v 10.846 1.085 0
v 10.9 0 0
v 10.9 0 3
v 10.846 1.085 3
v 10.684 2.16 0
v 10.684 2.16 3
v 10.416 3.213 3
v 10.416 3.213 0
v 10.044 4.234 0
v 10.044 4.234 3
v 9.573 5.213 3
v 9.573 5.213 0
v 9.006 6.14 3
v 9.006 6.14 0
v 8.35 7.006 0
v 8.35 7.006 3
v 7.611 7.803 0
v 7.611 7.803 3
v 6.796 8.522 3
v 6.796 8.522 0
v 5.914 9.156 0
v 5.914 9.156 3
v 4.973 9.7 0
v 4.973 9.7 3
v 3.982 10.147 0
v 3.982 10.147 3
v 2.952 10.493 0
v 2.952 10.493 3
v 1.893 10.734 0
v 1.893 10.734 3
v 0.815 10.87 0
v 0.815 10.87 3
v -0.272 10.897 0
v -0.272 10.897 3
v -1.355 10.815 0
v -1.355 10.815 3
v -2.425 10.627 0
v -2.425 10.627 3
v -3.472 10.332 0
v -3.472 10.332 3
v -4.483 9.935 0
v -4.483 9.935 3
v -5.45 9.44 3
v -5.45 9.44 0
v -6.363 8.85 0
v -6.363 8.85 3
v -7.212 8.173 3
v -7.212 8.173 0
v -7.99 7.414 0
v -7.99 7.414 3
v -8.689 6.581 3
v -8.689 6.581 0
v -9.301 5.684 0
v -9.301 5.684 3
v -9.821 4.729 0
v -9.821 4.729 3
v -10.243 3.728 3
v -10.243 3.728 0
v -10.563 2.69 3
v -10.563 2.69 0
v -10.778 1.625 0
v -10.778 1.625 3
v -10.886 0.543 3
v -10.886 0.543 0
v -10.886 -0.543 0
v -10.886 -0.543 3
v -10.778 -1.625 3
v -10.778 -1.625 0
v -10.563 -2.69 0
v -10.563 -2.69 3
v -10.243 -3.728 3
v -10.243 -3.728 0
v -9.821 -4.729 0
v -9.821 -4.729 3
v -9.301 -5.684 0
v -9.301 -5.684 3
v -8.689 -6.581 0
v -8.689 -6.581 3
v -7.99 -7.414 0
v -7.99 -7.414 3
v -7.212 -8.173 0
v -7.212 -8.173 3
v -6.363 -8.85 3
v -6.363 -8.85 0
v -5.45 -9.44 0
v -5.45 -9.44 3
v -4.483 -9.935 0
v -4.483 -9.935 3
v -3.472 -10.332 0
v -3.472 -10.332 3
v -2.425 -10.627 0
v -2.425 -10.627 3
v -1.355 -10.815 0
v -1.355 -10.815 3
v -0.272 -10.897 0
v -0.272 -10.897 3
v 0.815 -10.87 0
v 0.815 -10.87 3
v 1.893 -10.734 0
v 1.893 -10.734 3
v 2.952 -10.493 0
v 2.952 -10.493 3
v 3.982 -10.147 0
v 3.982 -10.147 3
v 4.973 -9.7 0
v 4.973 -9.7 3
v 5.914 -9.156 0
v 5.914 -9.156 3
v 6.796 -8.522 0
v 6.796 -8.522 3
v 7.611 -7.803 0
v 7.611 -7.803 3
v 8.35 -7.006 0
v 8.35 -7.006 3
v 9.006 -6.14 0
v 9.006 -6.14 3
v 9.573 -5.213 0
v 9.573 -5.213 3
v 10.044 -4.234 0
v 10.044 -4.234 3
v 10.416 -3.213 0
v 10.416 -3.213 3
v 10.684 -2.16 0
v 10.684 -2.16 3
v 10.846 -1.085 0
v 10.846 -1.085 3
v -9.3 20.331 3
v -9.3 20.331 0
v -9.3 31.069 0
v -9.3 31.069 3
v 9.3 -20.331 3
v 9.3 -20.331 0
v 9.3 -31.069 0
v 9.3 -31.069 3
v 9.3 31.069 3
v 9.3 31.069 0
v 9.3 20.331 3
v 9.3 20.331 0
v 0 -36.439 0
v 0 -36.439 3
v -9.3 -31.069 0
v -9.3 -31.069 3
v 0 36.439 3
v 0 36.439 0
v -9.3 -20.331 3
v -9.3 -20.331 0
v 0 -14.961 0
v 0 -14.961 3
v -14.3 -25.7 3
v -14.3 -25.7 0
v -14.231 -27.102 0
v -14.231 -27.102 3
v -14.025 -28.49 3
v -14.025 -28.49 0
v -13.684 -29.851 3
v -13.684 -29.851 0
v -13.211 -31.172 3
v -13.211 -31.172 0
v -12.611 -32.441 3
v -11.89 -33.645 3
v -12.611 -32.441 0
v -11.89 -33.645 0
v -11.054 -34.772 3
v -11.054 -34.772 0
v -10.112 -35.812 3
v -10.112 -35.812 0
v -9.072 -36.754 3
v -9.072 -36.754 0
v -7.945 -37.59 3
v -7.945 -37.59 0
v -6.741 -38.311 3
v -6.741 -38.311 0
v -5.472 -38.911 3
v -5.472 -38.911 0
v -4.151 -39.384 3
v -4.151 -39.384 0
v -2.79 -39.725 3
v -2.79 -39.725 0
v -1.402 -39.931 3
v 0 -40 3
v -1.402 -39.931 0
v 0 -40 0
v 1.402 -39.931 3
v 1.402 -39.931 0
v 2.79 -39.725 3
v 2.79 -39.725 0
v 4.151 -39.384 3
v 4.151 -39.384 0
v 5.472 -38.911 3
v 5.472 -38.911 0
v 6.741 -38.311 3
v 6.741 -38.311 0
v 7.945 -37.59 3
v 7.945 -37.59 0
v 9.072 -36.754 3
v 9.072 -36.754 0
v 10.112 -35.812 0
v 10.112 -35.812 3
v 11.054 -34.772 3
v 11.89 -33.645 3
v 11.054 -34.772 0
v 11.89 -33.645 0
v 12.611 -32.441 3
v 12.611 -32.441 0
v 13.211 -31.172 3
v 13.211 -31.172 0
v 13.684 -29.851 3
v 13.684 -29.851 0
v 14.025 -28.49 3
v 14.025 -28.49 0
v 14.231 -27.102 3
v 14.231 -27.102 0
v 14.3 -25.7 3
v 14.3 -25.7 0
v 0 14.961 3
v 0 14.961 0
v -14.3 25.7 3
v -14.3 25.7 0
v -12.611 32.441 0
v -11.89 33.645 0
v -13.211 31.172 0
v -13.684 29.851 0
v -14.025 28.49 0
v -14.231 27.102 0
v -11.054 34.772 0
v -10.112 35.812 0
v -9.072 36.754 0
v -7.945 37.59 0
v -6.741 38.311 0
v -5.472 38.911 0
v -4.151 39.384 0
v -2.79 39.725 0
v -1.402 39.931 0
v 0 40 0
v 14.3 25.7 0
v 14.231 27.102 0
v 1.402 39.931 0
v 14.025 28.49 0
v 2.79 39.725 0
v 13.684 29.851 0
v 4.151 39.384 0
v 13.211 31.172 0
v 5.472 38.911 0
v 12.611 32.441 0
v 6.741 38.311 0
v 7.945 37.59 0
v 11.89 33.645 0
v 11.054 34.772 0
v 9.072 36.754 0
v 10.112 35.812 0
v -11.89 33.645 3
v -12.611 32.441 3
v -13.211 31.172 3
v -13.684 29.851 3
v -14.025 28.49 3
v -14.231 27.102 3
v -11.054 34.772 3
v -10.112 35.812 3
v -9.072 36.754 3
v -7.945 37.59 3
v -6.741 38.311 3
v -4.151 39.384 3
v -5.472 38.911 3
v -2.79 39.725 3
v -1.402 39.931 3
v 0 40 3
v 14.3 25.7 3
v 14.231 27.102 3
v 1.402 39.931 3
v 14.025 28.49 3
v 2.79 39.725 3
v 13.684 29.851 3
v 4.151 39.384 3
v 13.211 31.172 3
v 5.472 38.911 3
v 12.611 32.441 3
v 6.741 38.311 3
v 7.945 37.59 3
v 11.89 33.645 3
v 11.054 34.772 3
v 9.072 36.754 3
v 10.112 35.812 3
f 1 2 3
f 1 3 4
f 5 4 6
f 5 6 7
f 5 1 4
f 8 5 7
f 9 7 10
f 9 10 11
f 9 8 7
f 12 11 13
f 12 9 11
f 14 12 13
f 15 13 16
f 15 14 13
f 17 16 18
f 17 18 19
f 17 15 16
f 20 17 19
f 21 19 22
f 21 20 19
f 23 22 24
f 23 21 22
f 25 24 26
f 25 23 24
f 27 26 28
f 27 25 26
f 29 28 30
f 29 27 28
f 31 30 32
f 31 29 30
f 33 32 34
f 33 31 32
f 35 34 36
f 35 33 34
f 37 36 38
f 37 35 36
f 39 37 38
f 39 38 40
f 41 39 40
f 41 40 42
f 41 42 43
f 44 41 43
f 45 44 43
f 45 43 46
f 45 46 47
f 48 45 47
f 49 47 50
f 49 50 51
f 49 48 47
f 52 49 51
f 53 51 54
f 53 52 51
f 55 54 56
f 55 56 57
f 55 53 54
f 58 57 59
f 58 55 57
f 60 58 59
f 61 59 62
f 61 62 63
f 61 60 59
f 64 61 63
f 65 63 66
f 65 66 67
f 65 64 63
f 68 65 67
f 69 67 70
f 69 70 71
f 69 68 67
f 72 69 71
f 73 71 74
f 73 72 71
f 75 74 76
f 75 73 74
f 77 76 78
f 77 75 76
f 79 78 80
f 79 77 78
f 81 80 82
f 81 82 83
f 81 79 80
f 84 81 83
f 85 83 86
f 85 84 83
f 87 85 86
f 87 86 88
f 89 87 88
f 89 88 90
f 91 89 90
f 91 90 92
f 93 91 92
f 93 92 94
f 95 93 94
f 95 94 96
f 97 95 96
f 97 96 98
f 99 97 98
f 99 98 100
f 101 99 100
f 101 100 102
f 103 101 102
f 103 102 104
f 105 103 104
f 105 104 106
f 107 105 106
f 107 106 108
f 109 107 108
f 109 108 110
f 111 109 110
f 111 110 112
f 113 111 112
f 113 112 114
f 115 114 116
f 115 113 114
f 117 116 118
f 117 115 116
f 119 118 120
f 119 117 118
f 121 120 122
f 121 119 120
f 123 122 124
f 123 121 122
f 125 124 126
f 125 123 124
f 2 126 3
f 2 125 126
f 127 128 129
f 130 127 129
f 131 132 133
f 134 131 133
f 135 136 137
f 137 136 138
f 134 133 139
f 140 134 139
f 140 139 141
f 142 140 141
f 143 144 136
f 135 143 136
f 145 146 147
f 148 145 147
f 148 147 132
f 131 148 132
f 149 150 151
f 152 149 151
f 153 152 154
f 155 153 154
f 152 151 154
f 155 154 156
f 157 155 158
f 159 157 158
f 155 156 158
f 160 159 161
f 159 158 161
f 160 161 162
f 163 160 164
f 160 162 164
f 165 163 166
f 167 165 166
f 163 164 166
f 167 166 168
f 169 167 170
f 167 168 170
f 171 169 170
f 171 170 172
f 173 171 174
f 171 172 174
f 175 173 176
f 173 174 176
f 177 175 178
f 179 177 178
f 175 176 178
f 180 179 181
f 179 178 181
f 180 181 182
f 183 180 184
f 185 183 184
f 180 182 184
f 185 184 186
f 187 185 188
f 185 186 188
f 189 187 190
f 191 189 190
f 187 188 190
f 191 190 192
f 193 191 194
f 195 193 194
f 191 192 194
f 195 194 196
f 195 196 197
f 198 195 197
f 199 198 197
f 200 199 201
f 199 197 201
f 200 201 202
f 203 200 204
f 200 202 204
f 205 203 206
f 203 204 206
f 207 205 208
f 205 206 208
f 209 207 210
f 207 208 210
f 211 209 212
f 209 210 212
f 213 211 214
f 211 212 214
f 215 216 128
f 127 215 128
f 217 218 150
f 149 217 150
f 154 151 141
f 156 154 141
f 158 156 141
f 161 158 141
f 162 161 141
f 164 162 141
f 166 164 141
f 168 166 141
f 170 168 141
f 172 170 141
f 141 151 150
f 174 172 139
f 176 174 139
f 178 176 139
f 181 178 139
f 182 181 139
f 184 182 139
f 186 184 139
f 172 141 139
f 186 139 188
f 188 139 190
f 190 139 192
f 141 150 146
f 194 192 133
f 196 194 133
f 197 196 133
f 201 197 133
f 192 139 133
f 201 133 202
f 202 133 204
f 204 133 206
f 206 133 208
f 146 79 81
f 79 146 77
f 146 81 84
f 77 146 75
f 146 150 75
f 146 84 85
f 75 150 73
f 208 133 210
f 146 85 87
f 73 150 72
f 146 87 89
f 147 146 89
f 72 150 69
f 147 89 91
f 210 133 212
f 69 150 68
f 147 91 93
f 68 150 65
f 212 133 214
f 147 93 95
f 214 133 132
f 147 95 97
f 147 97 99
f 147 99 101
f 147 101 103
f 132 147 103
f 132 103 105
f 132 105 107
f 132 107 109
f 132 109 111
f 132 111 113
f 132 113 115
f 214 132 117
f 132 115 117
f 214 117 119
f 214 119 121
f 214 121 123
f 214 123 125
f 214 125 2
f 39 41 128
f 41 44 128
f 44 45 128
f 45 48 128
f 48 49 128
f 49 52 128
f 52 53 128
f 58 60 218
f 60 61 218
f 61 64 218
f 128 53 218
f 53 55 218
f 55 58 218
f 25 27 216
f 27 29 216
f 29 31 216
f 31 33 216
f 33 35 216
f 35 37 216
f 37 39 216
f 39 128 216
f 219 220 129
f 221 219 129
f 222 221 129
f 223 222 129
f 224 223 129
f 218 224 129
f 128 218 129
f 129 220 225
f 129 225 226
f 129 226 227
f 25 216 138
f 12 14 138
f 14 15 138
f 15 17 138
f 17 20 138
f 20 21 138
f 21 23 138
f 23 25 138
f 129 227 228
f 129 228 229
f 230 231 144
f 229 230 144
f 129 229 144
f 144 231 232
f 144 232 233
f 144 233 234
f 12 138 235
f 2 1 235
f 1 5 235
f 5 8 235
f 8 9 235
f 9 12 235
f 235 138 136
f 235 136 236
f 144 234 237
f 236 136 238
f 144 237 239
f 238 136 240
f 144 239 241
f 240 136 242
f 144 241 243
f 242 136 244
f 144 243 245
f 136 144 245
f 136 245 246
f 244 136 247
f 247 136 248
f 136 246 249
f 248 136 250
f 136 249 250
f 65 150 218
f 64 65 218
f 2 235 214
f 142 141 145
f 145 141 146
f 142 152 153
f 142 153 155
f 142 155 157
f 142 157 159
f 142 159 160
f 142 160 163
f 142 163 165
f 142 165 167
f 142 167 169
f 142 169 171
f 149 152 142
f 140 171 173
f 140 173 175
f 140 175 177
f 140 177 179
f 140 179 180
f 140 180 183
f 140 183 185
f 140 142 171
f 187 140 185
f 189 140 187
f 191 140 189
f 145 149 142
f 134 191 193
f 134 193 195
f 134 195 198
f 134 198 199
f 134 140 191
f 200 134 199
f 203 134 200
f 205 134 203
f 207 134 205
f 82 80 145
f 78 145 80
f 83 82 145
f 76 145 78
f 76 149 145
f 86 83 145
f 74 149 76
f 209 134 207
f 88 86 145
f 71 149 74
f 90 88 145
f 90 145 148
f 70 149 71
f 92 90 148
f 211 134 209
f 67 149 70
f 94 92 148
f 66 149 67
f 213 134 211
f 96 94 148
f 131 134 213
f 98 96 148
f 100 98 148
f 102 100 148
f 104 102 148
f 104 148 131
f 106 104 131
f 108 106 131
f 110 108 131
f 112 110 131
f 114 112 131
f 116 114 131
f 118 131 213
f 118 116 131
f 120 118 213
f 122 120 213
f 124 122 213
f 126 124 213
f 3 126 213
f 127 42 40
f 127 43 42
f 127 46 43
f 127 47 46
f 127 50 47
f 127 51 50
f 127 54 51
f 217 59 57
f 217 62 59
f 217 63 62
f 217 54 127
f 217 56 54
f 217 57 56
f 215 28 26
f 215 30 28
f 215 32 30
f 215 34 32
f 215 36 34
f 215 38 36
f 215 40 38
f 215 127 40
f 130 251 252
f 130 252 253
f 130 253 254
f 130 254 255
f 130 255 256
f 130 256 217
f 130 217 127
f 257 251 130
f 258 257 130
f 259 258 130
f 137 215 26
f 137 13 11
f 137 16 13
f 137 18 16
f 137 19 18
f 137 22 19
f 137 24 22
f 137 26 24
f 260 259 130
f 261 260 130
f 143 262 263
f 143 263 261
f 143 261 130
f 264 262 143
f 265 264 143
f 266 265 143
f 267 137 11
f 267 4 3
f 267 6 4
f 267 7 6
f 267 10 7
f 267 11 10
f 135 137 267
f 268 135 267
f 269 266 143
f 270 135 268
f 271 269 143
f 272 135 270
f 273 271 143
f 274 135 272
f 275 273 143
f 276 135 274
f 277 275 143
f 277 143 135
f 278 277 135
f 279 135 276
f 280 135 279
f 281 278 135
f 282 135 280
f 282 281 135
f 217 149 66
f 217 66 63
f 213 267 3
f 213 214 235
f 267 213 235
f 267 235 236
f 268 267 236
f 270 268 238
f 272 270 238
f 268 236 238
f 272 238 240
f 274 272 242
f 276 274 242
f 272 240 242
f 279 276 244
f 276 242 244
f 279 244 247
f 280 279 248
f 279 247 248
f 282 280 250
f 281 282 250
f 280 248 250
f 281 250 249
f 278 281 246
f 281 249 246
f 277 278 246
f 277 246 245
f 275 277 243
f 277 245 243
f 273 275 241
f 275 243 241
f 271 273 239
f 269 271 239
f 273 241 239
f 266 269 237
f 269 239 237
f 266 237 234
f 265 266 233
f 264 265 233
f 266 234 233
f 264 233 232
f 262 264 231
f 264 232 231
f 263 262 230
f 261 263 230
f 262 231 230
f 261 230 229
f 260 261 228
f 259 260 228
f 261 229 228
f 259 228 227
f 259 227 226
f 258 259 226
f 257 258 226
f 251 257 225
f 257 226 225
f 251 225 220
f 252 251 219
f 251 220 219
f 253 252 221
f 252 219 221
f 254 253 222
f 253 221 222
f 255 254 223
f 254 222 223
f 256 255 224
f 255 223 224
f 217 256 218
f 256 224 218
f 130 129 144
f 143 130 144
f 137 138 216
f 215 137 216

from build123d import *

# Parameters (mm, degrees)
F0_R     = 10.9
F1_DEPTH = 3


with BuildPart() as f1:
    # F0 (on Top) → F1 (new body)
    with BuildSketch(Plane.XY):
        with BuildLine():
            Line((14.3, 0), (14.3, 25.7))
            ThreePointArc((14.3, 25.7), (0, 40), (-14.3, 25.7))
            Line((-14.3, 25.7), (-14.3, 0))
            Line((-14.3, 0), (-14.3, -25.7))
            ThreePointArc((-14.3, -25.7), (0, -40), (14.3, -25.7))
            Line((14.3, -25.7), (14.3, 0))
        make_face()
        Polygon((0, -14.961285), (9.3, -20.330642), (9.3, -31.069358), (0, -36.438715), (-9.3, -31.069358), (-9.3, -20.330642), align=None, mode=Mode.SUBTRACT)
        Circle(F0_R, mode=Mode.SUBTRACT)
        Polygon((0, 14.961285), (-9.3, 20.330642), (-9.3, 31.069358), (0, 36.438715), (9.3, 31.069358), (9.3, 20.330642), align=None, mode=Mode.SUBTRACT)
    extrude(amount=F1_DEPTH)


solid = f1.part
